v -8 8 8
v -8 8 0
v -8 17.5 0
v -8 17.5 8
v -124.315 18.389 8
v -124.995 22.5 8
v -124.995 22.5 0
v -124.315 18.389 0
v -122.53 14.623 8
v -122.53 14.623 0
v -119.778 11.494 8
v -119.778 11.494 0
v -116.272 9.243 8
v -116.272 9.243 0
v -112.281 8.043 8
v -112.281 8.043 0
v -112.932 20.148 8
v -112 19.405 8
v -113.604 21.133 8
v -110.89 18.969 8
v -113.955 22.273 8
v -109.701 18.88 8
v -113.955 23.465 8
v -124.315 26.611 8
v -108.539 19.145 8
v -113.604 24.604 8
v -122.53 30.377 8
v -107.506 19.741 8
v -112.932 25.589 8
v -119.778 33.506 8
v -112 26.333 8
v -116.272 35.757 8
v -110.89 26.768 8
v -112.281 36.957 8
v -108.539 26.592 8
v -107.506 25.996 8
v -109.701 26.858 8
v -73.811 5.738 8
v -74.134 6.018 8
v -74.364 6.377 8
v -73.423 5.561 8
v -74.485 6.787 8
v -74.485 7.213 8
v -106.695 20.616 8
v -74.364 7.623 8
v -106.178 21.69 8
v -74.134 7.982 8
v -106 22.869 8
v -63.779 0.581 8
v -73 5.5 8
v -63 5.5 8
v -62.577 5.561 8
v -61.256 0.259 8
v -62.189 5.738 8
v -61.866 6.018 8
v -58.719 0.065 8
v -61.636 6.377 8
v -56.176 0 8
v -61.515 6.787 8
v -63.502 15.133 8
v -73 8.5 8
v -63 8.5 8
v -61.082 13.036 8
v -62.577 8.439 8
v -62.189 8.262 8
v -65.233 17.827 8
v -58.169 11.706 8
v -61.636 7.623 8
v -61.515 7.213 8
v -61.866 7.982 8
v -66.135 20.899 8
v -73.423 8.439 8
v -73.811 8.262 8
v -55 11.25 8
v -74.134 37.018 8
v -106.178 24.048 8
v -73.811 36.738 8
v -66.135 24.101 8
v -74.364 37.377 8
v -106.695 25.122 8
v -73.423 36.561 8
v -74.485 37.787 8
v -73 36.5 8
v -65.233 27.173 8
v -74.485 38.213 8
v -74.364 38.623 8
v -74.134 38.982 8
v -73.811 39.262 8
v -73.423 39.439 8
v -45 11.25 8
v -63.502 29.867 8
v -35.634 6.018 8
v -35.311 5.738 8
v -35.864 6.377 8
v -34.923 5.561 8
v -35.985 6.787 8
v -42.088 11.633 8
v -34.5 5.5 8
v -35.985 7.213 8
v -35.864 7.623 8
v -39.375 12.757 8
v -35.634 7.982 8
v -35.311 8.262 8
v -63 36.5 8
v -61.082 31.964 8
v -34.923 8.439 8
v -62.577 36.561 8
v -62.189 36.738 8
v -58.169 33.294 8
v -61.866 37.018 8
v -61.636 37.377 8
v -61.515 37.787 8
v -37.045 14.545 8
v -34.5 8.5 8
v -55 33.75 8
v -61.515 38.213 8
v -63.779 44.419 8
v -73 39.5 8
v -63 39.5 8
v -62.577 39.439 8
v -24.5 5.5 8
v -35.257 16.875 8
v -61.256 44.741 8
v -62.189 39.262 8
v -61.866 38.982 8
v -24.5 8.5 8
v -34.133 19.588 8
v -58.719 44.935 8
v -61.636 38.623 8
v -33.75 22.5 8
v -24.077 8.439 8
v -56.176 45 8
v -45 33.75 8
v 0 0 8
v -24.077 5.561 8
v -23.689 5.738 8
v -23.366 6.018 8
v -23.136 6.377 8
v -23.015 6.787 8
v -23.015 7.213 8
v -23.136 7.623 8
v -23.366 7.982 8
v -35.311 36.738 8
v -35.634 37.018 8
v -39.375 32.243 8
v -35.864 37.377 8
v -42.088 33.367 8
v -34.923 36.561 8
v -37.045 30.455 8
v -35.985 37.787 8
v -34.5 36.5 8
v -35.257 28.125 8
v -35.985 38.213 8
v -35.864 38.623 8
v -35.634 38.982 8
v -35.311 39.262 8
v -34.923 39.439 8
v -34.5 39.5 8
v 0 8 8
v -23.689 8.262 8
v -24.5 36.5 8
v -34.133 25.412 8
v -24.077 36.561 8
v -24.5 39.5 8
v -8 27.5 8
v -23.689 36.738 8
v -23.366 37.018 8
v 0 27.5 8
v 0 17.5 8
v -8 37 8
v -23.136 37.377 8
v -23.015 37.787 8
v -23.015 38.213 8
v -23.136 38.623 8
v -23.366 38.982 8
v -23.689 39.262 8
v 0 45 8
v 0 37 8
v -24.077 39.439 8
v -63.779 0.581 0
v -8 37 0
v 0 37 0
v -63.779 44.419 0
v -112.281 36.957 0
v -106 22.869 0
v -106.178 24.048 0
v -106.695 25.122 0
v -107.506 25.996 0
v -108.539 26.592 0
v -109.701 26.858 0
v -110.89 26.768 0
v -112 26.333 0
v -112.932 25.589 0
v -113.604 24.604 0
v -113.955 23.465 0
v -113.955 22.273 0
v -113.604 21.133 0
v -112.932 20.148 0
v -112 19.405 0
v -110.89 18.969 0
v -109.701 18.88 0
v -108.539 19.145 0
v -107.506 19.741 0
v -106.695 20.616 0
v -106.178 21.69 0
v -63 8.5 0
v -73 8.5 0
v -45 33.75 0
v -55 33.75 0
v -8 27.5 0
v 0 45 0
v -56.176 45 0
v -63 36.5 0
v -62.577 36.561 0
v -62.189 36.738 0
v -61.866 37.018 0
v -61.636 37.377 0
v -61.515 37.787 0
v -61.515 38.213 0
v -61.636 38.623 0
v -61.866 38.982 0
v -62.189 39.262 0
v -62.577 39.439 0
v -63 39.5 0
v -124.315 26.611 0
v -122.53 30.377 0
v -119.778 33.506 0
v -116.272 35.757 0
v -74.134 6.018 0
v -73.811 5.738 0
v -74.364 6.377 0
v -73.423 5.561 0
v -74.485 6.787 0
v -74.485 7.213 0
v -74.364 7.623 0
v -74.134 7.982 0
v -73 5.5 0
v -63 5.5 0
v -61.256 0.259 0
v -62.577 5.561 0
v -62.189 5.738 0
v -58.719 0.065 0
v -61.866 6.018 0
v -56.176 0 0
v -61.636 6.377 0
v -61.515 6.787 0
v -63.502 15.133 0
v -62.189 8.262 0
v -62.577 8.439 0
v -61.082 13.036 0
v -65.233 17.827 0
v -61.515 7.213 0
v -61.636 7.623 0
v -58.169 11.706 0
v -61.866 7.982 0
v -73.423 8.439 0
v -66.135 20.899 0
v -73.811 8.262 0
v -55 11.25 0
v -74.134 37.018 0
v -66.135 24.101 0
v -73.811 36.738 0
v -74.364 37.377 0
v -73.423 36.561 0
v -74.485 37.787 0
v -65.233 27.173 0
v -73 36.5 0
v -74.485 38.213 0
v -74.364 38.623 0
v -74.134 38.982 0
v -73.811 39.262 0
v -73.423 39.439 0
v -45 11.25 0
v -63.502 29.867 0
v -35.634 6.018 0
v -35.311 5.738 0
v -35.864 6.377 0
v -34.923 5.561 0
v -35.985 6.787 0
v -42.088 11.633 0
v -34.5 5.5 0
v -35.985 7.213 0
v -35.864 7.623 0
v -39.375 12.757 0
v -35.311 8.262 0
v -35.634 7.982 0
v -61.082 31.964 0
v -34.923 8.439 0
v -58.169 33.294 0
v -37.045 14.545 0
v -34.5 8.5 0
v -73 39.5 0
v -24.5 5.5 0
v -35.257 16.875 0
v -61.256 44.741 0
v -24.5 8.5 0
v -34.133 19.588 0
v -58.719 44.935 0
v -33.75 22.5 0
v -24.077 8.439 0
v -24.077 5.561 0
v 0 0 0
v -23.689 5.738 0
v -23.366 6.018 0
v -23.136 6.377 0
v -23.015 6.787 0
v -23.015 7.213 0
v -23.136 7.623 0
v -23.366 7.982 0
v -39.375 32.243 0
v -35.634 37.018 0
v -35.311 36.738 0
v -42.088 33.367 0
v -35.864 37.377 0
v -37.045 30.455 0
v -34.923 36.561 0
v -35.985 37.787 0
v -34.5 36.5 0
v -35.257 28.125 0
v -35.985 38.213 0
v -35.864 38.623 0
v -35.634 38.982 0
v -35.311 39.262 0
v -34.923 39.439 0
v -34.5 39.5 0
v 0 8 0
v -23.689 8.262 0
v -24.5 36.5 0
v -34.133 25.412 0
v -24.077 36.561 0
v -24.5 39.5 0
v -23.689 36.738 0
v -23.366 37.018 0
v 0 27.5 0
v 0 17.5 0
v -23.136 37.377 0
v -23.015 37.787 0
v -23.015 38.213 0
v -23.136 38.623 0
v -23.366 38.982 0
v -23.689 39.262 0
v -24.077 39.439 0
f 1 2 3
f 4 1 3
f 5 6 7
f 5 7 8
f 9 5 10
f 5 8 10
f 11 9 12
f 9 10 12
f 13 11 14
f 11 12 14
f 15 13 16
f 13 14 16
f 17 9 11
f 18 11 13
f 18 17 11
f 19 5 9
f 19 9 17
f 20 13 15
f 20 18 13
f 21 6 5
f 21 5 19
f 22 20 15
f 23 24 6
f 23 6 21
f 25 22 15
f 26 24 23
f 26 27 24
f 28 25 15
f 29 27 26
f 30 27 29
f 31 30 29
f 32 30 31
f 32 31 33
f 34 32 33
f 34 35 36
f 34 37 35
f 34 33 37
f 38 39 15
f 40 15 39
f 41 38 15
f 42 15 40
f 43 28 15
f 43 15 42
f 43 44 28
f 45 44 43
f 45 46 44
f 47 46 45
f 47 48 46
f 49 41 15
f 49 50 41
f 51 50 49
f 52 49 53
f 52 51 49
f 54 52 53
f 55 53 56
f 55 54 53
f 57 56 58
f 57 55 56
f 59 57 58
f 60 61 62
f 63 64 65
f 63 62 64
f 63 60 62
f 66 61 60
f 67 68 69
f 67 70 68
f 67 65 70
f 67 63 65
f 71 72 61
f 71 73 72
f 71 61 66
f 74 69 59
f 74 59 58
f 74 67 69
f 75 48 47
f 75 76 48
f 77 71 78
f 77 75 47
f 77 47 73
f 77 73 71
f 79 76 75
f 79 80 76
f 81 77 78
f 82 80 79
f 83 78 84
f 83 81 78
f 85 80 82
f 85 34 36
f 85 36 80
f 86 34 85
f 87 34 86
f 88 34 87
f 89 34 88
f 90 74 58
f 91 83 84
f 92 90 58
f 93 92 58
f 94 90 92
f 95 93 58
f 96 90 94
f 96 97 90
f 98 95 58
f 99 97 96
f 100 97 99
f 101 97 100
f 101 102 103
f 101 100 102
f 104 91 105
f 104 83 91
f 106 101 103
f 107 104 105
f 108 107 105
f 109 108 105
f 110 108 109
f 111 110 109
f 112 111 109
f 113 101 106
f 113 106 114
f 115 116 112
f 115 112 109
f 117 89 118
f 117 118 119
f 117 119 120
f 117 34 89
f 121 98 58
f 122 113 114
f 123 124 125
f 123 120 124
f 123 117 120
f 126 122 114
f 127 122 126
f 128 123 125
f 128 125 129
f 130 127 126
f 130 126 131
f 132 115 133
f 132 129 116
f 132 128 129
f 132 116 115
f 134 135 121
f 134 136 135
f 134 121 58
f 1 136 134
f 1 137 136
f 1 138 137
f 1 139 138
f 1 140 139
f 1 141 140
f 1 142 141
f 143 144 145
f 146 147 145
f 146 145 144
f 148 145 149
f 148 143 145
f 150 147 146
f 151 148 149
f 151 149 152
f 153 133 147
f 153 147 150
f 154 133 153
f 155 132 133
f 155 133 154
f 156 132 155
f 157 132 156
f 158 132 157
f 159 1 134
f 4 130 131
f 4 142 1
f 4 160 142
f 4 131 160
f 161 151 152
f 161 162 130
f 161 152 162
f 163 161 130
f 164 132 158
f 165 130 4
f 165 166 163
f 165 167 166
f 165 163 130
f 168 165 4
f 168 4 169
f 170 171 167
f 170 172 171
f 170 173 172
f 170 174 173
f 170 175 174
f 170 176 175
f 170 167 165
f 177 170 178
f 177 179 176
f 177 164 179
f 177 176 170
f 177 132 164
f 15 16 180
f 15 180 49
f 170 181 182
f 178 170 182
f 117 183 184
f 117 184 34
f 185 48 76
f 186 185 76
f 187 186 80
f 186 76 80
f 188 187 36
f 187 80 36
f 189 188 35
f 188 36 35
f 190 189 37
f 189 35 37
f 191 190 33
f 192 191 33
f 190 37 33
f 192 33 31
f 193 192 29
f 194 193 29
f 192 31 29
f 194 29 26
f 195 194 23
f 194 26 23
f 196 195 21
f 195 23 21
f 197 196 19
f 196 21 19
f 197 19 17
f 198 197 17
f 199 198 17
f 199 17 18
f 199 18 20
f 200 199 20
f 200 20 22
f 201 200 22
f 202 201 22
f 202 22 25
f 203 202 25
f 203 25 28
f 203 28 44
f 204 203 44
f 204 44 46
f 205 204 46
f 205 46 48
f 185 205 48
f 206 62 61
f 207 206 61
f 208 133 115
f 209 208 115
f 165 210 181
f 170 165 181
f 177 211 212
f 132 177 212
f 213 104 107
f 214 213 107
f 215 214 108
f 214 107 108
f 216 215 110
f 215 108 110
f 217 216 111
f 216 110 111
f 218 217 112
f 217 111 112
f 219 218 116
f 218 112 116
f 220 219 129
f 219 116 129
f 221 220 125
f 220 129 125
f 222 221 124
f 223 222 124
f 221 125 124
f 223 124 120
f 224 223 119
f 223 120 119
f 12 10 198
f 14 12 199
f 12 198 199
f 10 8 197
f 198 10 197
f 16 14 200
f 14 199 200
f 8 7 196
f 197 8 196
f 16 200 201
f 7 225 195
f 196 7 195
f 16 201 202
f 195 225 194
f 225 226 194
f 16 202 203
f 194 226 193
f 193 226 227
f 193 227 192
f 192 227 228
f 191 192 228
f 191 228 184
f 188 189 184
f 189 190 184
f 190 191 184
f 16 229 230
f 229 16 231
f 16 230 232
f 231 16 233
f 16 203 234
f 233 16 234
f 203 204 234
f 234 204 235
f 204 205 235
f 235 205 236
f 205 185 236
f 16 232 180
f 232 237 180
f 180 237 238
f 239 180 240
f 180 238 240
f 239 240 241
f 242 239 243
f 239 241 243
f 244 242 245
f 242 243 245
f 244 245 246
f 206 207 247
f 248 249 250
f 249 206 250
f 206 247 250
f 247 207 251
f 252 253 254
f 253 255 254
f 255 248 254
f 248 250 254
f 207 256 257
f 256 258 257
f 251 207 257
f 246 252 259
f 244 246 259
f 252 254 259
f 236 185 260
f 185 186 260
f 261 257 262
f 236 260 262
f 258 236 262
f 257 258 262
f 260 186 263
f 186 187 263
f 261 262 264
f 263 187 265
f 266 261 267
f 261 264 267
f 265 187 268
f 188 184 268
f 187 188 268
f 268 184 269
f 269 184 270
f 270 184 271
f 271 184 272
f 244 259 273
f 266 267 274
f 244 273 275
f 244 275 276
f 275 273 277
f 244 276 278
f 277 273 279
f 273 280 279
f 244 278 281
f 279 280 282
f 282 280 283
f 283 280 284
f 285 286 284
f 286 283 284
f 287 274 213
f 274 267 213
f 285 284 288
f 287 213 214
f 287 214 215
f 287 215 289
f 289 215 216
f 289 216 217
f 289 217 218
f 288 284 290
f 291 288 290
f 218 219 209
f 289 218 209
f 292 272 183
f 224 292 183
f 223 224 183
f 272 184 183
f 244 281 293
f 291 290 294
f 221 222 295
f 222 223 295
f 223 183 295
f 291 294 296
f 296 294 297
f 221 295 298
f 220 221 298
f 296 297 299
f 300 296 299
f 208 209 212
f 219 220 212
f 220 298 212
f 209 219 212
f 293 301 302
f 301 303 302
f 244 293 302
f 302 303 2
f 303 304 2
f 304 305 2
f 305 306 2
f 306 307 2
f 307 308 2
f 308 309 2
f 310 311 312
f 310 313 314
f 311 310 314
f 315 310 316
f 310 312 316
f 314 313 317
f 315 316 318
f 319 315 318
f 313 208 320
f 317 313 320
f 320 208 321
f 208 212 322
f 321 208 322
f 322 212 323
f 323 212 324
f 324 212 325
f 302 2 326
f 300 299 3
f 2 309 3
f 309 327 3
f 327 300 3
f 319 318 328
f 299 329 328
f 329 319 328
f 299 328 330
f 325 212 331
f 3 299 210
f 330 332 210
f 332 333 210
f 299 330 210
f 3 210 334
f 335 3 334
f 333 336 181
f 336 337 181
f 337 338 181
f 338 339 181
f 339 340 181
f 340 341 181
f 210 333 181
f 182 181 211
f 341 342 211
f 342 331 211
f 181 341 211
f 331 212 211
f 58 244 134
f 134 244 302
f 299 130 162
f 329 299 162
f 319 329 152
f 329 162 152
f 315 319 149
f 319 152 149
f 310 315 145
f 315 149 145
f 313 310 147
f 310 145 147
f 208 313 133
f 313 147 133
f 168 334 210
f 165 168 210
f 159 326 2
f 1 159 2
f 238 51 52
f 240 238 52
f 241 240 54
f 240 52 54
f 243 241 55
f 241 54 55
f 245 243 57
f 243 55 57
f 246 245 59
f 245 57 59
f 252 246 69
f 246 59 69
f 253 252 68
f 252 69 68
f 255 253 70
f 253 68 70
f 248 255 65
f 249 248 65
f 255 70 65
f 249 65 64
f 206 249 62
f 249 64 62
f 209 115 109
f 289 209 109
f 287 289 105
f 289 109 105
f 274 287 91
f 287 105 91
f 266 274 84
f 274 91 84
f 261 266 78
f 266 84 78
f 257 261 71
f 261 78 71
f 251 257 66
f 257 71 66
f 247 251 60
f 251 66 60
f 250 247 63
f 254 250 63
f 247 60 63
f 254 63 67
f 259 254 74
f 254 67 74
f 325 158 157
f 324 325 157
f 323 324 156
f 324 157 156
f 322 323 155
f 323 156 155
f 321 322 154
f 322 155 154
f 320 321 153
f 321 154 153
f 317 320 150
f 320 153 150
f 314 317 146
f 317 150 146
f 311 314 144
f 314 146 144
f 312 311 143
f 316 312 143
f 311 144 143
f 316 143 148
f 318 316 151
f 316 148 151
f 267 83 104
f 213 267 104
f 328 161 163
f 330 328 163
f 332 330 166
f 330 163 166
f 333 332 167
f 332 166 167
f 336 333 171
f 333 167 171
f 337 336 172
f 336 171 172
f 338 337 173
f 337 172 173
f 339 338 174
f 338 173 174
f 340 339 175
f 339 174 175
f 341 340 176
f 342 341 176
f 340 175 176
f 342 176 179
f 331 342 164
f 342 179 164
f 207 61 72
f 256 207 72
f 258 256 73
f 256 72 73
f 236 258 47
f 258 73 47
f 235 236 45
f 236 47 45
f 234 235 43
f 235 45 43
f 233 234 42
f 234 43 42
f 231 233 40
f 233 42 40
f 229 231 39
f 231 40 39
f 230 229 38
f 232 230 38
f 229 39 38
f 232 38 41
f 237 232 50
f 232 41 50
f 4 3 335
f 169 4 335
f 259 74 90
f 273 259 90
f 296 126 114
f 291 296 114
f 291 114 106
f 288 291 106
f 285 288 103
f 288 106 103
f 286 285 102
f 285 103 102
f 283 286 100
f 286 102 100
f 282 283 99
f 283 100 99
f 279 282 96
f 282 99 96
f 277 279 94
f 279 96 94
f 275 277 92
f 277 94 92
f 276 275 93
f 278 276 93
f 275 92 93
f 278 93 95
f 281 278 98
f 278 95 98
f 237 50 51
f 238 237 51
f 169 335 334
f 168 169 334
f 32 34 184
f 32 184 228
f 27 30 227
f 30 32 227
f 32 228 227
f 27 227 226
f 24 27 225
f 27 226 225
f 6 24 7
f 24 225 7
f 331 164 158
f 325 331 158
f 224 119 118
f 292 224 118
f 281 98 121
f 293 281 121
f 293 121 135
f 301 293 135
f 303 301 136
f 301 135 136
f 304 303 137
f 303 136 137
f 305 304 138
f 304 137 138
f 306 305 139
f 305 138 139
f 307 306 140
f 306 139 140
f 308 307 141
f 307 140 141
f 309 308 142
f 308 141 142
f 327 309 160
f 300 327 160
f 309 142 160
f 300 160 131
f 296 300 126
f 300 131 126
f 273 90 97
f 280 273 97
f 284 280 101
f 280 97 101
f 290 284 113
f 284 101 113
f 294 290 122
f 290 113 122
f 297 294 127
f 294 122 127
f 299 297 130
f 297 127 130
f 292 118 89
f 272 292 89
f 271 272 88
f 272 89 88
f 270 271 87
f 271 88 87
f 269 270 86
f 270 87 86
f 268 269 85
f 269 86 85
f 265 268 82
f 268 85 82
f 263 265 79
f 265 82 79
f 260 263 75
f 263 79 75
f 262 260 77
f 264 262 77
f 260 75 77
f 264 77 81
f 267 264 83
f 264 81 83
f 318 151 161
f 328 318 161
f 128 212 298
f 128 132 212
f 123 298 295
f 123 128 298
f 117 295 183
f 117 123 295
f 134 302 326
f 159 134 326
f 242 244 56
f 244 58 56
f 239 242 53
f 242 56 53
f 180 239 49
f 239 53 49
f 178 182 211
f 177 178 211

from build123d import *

# Parameters (mm, degrees)
BOSS_EXTRUDE1_DEPTH = 8
CHAMFER1_SIZE       = 10
CHAMFER1_SIZE2      = 65
CHAMFER2_SIZE       = 65
CHAMFER2_SIZE2      = 10
FILLET2_R           = 15
FILLET3_R           = 50
SKETCH2_R           = 4
CUT_EXTRUDE1_DEPTH  = 80
CUT_EXTRUDE2_DEPTH  = 8


with BuildPart() as part:
    # Sketch1 → Boss-Extrude1 (new body)
    with BuildSketch(Plane.XY):
        Polygon((0, 17.5), (0, 27.5), (-8, 27.5), (-8, 37), (0, 37), (0, 45), (-125, 45), (-125, 22.5), (-125, 0), (0, 0), (0, 8), (-8, 8), (-8, 17.5), align=None)
    extrude(amount=BOSS_EXTRUDE1_DEPTH)

    # Chamfer1
    chamfer1_edges = [part.edges().sort_by_distance(p)[0] for p in [
        (-125, 0, 4),
    ]]
    chamfer1_side = [part.faces().sort_by_distance(p)[0] for p in [
        (-125, 22.5, 4),
    ]]
    chamfer(chamfer1_edges, length=CHAMFER1_SIZE, length2=CHAMFER1_SIZE2, reference=chamfer1_side[0])

    # Chamfer2
    chamfer2_edges = [part.edges().sort_by_distance(p)[0] for p in [
        (-125, 45, 4),
    ]]
    chamfer2_side = [part.faces().sort_by_distance(p)[0] for p in [
        (-62.5, 45, 4),
    ]]
    chamfer(chamfer2_edges, length=CHAMFER2_SIZE, length2=CHAMFER2_SIZE2, reference=chamfer2_side[0])

    # Fillet2
    # the kernel refuses this fillet: 15 mm, written as the material it takes off along each edge
    with BuildSketch(Plane(origin=(-125, 10, -32.171960879), x_dir=(0, 1, 0), z_dir=(0, 0, 1))) as fillet2_piece_1:
        with BuildLine():
            CenterArc((FILLET2_R * 0.857918956767, -FILLET2_R), FILLET2_R, 90, 81.253837737)
            Line((-FILLET2_R * 0.130452740884, -FILLET2_R * 0.847942815746), (0, 0))
            Line((0, 0), (FILLET2_R * 0.857918956767, 0))
        make_face()
    extrude(amount=72.343921757, mode=Mode.SUBTRACT)
    with BuildSketch(Plane(origin=(-125, 35, -32.171960879), x_dir=(0, -1, 0), z_dir=(0, 0, 1))) as fillet2_piece_2:
        with BuildLine():
            CenterArc((FILLET2_R * 0.857918956767, FILLET2_R), FILLET2_R, 188.746162263, 81.253837737)
            Line((-FILLET2_R * 0.130452740884, FILLET2_R * 0.847942815746), (0, 0))
            Line((0, 0), (FILLET2_R * 0.857918956767, 0))
        make_face()
    extrude(amount=72.343921757, mode=Mode.SUBTRACT)

    # Fillet3
    fillet3_edges = [part.edges().sort_by_distance(p)[0] for p in [
        (-60, 0, 4),
        (-60, 45, 4),
    ]]
    fillet(fillet3_edges, radius=FILLET3_R)

    # Sketch2 → Cut-Extrude1 (cut)
    with BuildSketch(Plane.XY.offset(8)):
        with Locations((-110, 22.868784351)):
            Circle(SKETCH2_R)
    extrude(amount=-CUT_EXTRUDE1_DEPTH, mode=Mode.SUBTRACT)

    # Sketch3 → Cut-Extrude2 (cut)
    with BuildSketch(Plane.XY.offset(8)):
        with BuildLine():
            Line((-73, 5.5), (-63, 5.5))
            ThreePointArc((-63, 5.5), (-61.5, 7), (-63, 8.5))
            Line((-63, 8.5), (-73, 8.5))
            ThreePointArc((-73, 8.5), (-74.5, 7), (-73, 5.5))
        make_face()
        with BuildLine():
            Line((-73, 36.5), (-63, 36.5))
            ThreePointArc((-63, 36.5), (-61.5, 38), (-63, 39.5))
            Line((-63, 39.5), (-73, 39.5))
            ThreePointArc((-73, 39.5), (-74.5, 38), (-73, 36.5))
        make_face()
        with BuildLine():
            ThreePointArc((-45, 11.25), (-37.045048712, 14.545048712), (-33.75, 22.5))
            Line((-33.75, 22.5), (-50, 22.5))
            Line((-50, 22.5), (-50, 33.75))
            Line((-50, 33.75), (-55, 33.75))
            ThreePointArc((-55, 33.75), (-66.25, 22.5), (-55, 11.25))
            Line((-55, 11.25), (-45, 11.25))
        make_face()
        with BuildLine():
            Line((-50, 22.5), (-33.75, 22.5))
            ThreePointArc((-33.75, 22.5), (-37.045048712, 30.454951288), (-45, 33.75))
            Line((-45, 33.75), (-50, 33.75))
            Line((-50, 33.75), (-50, 22.5))
        make_face()
        with BuildLine():
            Line((-34.5, 36.5), (-24.5, 36.5))
            ThreePointArc((-24.5, 36.5), (-23, 38), (-24.5, 39.5))
            Line((-24.5, 39.5), (-34.5, 39.5))
            ThreePointArc((-34.5, 39.5), (-36, 38), (-34.5, 36.5))
        make_face()
        with BuildLine():
            Line((-34.5, 5.5), (-24.5, 5.5))
            ThreePointArc((-24.5, 5.5), (-23, 7), (-24.5, 8.5))
            Line((-24.5, 8.5), (-34.5, 8.5))
            ThreePointArc((-34.5, 8.5), (-36, 7), (-34.5, 5.5))
        make_face()
    extrude(amount=-CUT_EXTRUDE2_DEPTH, mode=Mode.SUBTRACT)


solid = part.part
